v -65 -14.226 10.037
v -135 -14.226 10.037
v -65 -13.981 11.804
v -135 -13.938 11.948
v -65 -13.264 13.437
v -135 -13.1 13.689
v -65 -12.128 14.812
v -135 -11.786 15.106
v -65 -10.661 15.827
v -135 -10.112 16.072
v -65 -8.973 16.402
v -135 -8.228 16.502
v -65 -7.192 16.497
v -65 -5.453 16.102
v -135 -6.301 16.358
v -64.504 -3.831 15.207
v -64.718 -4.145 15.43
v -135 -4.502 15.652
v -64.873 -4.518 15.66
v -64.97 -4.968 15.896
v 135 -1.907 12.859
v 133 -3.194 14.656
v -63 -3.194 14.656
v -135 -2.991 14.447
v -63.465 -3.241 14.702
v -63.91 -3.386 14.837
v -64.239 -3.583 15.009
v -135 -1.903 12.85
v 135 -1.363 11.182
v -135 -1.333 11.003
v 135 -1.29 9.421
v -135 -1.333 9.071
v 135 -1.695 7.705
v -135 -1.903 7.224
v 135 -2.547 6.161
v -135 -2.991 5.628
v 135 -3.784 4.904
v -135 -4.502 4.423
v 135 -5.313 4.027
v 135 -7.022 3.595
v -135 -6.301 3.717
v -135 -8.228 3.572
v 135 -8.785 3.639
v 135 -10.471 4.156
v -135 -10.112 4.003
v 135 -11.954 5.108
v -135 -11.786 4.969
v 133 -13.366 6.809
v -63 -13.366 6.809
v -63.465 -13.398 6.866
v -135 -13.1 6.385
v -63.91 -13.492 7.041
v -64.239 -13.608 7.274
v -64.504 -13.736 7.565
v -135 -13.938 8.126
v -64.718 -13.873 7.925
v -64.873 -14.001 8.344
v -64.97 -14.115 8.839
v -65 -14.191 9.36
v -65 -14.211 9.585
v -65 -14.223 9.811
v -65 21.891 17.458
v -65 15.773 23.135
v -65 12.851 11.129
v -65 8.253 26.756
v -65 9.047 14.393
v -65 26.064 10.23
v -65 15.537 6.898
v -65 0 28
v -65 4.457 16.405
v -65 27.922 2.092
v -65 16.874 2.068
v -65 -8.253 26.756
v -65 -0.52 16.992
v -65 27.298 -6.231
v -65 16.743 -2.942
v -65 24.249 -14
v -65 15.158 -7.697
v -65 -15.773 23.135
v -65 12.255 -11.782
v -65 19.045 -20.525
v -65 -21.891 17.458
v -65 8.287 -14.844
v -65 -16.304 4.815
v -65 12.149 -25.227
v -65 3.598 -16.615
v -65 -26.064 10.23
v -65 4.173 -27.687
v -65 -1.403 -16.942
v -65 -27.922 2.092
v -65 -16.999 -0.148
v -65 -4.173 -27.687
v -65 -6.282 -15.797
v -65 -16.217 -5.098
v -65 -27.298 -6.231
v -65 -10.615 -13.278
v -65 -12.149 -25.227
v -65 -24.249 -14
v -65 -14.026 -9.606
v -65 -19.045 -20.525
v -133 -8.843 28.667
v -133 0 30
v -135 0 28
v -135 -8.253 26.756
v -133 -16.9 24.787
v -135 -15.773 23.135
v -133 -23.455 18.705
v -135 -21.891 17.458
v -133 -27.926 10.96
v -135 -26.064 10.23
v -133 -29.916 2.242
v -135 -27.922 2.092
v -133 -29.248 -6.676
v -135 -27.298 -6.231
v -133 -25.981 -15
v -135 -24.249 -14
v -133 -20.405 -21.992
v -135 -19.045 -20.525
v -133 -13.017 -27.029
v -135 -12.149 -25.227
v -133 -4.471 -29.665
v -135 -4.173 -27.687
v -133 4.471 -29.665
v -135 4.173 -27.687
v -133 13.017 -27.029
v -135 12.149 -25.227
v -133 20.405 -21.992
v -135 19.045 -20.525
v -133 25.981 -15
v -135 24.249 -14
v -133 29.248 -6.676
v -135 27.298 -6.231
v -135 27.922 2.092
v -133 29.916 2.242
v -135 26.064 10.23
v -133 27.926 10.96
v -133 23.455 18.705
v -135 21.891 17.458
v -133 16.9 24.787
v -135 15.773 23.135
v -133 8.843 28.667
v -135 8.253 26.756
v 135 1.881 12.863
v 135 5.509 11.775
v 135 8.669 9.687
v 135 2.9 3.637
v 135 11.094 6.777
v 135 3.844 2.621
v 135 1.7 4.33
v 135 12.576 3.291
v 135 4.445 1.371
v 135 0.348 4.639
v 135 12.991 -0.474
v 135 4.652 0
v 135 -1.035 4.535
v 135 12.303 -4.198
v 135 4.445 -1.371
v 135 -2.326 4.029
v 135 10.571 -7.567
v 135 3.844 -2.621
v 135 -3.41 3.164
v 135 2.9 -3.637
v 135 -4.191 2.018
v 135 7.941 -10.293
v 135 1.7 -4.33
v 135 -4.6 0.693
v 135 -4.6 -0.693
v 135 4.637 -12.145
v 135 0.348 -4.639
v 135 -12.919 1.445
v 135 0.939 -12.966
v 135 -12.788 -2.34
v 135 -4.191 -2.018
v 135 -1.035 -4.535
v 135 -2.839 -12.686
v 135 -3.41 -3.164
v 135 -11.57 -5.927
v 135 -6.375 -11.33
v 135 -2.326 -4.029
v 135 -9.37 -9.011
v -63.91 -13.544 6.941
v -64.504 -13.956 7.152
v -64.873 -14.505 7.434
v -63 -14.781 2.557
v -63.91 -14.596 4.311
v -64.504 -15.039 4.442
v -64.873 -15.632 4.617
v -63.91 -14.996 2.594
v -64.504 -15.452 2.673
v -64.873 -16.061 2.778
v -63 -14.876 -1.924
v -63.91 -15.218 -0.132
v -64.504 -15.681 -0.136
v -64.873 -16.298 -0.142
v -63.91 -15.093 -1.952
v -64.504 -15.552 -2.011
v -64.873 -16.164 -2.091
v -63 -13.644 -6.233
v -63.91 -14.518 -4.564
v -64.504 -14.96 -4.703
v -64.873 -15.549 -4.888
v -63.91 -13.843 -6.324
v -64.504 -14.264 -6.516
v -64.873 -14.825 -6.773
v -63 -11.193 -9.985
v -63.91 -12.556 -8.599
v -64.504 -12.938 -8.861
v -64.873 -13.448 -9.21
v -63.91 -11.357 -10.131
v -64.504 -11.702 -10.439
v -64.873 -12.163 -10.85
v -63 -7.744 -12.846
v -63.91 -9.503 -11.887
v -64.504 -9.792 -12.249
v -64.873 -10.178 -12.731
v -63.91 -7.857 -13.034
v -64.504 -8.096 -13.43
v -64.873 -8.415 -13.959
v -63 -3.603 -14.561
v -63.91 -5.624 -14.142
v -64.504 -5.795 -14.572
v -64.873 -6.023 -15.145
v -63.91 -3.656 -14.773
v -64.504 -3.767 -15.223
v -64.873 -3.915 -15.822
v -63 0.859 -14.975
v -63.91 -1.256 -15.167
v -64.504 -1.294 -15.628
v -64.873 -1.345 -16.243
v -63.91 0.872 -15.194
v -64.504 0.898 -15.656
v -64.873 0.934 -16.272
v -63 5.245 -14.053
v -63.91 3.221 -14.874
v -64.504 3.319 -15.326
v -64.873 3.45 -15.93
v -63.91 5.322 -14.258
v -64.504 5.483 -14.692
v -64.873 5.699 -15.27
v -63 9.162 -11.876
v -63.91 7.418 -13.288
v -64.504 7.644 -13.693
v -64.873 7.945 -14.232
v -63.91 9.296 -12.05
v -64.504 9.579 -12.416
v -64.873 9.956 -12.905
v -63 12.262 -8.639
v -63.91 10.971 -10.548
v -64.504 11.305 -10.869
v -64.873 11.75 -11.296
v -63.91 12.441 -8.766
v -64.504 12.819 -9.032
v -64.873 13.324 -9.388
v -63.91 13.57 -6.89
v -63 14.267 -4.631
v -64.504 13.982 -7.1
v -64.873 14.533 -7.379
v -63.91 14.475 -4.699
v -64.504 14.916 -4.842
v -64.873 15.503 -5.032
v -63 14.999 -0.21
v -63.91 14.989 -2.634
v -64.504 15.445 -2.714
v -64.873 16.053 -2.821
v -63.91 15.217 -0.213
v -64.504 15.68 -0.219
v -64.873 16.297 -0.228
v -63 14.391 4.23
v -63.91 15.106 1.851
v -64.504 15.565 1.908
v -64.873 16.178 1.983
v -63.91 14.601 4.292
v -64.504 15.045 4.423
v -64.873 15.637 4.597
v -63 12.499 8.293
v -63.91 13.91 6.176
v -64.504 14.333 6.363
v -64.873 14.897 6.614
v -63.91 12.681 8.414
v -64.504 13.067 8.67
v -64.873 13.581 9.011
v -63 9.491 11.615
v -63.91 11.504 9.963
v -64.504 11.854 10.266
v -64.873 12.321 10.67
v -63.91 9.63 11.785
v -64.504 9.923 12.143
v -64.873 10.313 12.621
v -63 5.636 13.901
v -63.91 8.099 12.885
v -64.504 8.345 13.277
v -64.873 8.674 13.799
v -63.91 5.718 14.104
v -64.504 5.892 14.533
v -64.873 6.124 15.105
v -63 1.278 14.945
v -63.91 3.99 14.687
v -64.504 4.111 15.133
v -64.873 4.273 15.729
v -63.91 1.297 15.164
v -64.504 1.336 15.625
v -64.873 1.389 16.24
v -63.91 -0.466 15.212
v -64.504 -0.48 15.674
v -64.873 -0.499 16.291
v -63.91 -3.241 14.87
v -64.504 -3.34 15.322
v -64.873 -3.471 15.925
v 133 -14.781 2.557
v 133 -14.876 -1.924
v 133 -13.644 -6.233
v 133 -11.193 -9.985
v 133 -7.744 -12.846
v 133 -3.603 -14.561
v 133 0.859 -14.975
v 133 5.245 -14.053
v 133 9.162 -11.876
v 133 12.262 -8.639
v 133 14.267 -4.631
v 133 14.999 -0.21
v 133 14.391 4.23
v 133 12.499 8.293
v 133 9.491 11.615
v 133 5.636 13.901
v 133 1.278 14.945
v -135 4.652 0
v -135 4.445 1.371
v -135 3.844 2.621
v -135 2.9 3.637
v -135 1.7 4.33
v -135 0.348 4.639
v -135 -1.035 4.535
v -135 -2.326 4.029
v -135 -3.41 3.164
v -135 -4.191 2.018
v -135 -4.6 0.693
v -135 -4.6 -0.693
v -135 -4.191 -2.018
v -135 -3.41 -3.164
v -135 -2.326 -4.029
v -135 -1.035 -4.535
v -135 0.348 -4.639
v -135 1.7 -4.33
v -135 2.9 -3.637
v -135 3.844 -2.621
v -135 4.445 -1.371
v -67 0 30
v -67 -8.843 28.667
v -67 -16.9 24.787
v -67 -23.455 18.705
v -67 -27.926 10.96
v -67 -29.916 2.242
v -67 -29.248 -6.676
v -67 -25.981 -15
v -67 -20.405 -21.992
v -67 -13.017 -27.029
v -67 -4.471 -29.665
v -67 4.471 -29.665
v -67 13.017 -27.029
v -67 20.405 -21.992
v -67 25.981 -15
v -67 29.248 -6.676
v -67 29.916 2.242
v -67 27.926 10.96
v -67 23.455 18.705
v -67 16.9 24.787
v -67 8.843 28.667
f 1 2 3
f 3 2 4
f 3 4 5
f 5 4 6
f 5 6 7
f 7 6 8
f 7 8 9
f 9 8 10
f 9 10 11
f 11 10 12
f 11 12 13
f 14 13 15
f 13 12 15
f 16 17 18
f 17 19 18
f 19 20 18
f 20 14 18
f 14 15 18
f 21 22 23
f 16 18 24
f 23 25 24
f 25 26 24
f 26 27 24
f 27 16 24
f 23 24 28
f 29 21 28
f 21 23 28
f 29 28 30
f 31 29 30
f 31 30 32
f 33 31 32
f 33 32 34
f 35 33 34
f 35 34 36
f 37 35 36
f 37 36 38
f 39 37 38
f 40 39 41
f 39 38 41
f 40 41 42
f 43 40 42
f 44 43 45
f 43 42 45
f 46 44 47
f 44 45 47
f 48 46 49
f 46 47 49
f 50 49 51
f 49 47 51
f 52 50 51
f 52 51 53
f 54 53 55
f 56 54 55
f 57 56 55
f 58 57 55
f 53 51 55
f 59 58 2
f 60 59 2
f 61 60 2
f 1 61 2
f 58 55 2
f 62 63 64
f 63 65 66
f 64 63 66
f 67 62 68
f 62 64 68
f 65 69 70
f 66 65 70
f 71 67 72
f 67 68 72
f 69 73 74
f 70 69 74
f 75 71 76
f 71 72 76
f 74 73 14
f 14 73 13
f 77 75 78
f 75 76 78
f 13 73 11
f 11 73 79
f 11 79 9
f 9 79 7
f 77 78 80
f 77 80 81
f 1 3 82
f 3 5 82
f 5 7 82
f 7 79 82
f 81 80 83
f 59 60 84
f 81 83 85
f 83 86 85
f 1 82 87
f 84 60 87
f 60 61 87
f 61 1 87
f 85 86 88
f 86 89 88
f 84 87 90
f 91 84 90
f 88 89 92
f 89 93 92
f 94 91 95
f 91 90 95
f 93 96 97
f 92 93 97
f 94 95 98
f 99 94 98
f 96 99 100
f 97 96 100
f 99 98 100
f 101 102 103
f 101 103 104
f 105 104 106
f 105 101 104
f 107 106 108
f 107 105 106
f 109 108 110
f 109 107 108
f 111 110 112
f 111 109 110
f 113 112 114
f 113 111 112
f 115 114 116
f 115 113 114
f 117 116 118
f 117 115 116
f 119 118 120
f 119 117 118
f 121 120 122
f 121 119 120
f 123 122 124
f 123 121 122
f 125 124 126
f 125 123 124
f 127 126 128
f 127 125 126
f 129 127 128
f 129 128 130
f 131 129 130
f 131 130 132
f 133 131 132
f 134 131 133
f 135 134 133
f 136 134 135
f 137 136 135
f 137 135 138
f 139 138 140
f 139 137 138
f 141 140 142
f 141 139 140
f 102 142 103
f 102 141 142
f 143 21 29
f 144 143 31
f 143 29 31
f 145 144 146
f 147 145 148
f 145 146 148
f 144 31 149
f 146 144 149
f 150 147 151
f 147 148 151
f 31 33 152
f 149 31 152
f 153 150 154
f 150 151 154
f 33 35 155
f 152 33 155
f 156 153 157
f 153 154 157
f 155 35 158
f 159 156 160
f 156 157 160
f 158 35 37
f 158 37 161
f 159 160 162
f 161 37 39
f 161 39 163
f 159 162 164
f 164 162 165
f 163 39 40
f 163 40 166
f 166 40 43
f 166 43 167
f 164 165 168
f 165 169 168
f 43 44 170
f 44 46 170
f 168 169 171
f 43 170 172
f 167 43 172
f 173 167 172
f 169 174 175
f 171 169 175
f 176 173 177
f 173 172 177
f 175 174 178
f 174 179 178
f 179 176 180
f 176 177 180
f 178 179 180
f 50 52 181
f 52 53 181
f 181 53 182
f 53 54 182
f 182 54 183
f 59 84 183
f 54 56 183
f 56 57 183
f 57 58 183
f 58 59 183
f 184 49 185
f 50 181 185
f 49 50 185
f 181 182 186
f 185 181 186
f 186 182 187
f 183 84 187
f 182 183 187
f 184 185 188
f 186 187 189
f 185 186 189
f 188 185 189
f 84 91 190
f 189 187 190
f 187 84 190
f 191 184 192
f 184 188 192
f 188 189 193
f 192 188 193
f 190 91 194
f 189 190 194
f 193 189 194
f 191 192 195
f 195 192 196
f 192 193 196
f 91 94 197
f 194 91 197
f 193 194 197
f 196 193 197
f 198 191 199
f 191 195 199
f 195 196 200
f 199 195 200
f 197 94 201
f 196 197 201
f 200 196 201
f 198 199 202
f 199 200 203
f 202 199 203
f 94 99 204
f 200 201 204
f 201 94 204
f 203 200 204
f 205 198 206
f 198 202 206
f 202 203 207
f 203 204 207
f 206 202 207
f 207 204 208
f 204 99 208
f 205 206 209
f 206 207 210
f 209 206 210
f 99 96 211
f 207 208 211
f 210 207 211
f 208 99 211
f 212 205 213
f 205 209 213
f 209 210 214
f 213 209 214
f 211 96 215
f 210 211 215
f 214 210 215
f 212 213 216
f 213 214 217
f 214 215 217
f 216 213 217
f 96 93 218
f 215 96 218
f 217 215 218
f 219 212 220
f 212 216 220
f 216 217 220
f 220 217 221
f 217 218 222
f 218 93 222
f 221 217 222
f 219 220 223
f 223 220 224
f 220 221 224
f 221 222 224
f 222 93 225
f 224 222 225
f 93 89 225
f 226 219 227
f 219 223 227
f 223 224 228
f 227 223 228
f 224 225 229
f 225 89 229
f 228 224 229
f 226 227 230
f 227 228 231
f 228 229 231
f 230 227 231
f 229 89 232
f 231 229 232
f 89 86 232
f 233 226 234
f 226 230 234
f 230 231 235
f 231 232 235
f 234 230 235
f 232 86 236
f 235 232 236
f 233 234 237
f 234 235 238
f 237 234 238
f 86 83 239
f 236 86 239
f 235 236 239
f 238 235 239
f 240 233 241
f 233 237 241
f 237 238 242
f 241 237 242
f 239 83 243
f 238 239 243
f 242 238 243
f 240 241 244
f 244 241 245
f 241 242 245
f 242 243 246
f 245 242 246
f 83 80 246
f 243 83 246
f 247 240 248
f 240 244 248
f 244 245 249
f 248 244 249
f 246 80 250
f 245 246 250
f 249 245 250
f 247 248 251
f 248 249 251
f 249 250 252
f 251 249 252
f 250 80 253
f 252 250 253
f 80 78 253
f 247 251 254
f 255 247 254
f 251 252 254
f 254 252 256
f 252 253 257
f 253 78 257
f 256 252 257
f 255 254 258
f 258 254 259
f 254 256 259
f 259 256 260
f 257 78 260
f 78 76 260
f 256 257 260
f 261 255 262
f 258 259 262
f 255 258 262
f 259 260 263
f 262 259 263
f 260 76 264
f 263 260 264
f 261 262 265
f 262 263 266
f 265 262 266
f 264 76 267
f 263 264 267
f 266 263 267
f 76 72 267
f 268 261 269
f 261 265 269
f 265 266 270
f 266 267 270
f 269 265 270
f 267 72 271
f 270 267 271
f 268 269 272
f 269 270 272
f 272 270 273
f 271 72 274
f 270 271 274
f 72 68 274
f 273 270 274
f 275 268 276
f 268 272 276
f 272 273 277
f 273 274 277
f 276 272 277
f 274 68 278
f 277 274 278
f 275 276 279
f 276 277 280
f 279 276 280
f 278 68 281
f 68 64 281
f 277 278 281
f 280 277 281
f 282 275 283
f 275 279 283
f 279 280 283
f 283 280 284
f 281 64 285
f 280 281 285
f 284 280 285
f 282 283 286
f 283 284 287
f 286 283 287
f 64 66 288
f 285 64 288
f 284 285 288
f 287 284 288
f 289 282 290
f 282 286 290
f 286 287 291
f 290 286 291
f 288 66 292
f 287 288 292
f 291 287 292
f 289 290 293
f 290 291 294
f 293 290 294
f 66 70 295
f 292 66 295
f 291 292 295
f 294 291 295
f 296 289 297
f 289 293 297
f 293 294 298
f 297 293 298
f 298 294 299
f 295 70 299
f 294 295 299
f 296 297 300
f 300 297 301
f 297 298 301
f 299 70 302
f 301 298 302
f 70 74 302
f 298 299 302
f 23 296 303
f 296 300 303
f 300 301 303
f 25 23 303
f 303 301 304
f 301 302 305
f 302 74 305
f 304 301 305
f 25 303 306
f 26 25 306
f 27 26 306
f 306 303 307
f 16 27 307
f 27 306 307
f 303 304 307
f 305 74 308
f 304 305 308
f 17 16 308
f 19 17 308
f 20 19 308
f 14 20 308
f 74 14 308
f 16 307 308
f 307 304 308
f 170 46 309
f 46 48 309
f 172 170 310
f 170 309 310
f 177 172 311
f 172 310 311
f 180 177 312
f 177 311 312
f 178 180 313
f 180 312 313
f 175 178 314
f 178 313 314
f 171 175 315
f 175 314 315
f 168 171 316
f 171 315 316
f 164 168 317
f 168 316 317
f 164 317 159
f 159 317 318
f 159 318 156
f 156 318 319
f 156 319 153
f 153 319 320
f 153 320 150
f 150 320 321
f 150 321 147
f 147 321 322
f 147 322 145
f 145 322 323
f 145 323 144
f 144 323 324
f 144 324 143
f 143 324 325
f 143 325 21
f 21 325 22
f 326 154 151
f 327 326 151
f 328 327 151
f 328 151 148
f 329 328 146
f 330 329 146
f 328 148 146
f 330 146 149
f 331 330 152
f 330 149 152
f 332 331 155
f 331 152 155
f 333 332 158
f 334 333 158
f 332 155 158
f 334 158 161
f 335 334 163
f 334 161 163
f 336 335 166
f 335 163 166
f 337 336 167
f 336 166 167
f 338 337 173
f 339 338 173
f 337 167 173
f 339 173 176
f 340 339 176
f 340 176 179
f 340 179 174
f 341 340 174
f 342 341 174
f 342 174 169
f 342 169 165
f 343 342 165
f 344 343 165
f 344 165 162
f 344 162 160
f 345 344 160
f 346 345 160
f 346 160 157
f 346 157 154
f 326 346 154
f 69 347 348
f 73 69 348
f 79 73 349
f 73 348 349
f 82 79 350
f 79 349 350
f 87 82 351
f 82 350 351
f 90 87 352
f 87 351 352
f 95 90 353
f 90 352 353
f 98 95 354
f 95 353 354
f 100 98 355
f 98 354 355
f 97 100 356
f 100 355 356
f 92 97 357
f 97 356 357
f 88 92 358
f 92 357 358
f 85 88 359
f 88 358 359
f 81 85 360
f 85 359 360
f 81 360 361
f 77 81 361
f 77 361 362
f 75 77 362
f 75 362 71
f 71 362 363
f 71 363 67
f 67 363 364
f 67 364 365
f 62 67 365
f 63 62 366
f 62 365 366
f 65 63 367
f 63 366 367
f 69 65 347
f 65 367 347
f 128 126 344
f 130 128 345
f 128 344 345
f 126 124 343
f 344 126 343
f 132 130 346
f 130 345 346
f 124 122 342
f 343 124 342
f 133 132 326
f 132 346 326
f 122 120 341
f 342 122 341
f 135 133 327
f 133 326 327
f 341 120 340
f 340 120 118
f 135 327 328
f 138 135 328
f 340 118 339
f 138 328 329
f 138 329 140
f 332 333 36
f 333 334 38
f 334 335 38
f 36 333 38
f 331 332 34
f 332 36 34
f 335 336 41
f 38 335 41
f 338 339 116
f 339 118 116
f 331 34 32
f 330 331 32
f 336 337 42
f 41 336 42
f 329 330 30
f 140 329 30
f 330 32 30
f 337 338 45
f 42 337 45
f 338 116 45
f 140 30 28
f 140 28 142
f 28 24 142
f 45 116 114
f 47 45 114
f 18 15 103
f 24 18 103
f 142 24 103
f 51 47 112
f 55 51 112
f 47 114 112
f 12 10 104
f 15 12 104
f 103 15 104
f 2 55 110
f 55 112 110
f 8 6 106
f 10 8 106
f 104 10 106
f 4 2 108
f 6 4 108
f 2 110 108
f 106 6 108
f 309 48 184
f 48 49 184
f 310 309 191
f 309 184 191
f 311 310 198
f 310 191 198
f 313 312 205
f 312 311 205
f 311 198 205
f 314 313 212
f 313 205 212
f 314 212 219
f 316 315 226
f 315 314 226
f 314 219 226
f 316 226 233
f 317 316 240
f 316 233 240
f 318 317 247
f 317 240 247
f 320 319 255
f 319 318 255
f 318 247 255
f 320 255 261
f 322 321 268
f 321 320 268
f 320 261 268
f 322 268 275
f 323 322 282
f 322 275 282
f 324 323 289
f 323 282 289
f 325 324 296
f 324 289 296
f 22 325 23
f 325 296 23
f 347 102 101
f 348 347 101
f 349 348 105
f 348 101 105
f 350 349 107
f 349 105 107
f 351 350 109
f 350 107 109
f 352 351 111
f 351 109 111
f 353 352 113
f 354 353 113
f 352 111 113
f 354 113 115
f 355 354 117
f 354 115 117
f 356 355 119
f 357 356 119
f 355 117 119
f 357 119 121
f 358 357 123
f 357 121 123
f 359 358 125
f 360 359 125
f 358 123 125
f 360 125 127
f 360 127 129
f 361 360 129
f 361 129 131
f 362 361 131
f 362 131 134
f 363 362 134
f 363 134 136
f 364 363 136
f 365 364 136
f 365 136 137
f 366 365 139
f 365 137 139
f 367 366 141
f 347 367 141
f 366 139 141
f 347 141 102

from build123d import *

# Parameters (mm, degrees)
F2_SIZE2 = 2
F2_SIZE  = 2
F3_R     = 4.652027
F4_DEPTH = 270.001
F6_R     = 6.482878
F7_DEPTH = 270.001


with BuildPart() as f1:
    # F0 (on Front) → F1 (revolve)
    with BuildSketch(Plane.XZ):
        with BuildLine():
            Line((-135, 30), (-135, 0))
            Line((-135, 0), (135, 0))
            Line((135, 0), (135, 15))
            Line((135, 15), (-63, 15))
            ThreePointArc((-63, 15), (-64.414214, 15.585786), (-65, 17))
            Line((-65, 17), (-65, 30))
            Line((-65, 30), (-135, 30))
        make_face()
    revolve(axis=Axis((9.817764, 0, 0), (1, 0, 0)))

    # F2
    f2_edges = [f1.edges().sort_by_distance(p)[0] for p in [
        (-65, 0, -30),
        (-135, 0, -30),
        (-100, 0, 30),
        (135, 0, -15),
    ]]
    chamfer(f2_edges, length=F2_SIZE, length2=F2_SIZE2)

    # F3 (on face) → F4 (cut, through all)
    with BuildSketch(Plane.YZ.offset(135)):
        Circle(F3_R)
    extrude(amount=-F4_DEPTH, mode=Mode.SUBTRACT)

    # F6 (on face) → F7 (cut, through all)
    with BuildSketch(Plane(origin=(-135, 0, 0), x_dir=(0, -1, 0), z_dir=(-1, 0, 0))):
        with Locations((7.74362, 10.037243)):
            Circle(F6_R)
    extrude(amount=-F7_DEPTH, mode=Mode.SUBTRACT)


solid = f1.part
